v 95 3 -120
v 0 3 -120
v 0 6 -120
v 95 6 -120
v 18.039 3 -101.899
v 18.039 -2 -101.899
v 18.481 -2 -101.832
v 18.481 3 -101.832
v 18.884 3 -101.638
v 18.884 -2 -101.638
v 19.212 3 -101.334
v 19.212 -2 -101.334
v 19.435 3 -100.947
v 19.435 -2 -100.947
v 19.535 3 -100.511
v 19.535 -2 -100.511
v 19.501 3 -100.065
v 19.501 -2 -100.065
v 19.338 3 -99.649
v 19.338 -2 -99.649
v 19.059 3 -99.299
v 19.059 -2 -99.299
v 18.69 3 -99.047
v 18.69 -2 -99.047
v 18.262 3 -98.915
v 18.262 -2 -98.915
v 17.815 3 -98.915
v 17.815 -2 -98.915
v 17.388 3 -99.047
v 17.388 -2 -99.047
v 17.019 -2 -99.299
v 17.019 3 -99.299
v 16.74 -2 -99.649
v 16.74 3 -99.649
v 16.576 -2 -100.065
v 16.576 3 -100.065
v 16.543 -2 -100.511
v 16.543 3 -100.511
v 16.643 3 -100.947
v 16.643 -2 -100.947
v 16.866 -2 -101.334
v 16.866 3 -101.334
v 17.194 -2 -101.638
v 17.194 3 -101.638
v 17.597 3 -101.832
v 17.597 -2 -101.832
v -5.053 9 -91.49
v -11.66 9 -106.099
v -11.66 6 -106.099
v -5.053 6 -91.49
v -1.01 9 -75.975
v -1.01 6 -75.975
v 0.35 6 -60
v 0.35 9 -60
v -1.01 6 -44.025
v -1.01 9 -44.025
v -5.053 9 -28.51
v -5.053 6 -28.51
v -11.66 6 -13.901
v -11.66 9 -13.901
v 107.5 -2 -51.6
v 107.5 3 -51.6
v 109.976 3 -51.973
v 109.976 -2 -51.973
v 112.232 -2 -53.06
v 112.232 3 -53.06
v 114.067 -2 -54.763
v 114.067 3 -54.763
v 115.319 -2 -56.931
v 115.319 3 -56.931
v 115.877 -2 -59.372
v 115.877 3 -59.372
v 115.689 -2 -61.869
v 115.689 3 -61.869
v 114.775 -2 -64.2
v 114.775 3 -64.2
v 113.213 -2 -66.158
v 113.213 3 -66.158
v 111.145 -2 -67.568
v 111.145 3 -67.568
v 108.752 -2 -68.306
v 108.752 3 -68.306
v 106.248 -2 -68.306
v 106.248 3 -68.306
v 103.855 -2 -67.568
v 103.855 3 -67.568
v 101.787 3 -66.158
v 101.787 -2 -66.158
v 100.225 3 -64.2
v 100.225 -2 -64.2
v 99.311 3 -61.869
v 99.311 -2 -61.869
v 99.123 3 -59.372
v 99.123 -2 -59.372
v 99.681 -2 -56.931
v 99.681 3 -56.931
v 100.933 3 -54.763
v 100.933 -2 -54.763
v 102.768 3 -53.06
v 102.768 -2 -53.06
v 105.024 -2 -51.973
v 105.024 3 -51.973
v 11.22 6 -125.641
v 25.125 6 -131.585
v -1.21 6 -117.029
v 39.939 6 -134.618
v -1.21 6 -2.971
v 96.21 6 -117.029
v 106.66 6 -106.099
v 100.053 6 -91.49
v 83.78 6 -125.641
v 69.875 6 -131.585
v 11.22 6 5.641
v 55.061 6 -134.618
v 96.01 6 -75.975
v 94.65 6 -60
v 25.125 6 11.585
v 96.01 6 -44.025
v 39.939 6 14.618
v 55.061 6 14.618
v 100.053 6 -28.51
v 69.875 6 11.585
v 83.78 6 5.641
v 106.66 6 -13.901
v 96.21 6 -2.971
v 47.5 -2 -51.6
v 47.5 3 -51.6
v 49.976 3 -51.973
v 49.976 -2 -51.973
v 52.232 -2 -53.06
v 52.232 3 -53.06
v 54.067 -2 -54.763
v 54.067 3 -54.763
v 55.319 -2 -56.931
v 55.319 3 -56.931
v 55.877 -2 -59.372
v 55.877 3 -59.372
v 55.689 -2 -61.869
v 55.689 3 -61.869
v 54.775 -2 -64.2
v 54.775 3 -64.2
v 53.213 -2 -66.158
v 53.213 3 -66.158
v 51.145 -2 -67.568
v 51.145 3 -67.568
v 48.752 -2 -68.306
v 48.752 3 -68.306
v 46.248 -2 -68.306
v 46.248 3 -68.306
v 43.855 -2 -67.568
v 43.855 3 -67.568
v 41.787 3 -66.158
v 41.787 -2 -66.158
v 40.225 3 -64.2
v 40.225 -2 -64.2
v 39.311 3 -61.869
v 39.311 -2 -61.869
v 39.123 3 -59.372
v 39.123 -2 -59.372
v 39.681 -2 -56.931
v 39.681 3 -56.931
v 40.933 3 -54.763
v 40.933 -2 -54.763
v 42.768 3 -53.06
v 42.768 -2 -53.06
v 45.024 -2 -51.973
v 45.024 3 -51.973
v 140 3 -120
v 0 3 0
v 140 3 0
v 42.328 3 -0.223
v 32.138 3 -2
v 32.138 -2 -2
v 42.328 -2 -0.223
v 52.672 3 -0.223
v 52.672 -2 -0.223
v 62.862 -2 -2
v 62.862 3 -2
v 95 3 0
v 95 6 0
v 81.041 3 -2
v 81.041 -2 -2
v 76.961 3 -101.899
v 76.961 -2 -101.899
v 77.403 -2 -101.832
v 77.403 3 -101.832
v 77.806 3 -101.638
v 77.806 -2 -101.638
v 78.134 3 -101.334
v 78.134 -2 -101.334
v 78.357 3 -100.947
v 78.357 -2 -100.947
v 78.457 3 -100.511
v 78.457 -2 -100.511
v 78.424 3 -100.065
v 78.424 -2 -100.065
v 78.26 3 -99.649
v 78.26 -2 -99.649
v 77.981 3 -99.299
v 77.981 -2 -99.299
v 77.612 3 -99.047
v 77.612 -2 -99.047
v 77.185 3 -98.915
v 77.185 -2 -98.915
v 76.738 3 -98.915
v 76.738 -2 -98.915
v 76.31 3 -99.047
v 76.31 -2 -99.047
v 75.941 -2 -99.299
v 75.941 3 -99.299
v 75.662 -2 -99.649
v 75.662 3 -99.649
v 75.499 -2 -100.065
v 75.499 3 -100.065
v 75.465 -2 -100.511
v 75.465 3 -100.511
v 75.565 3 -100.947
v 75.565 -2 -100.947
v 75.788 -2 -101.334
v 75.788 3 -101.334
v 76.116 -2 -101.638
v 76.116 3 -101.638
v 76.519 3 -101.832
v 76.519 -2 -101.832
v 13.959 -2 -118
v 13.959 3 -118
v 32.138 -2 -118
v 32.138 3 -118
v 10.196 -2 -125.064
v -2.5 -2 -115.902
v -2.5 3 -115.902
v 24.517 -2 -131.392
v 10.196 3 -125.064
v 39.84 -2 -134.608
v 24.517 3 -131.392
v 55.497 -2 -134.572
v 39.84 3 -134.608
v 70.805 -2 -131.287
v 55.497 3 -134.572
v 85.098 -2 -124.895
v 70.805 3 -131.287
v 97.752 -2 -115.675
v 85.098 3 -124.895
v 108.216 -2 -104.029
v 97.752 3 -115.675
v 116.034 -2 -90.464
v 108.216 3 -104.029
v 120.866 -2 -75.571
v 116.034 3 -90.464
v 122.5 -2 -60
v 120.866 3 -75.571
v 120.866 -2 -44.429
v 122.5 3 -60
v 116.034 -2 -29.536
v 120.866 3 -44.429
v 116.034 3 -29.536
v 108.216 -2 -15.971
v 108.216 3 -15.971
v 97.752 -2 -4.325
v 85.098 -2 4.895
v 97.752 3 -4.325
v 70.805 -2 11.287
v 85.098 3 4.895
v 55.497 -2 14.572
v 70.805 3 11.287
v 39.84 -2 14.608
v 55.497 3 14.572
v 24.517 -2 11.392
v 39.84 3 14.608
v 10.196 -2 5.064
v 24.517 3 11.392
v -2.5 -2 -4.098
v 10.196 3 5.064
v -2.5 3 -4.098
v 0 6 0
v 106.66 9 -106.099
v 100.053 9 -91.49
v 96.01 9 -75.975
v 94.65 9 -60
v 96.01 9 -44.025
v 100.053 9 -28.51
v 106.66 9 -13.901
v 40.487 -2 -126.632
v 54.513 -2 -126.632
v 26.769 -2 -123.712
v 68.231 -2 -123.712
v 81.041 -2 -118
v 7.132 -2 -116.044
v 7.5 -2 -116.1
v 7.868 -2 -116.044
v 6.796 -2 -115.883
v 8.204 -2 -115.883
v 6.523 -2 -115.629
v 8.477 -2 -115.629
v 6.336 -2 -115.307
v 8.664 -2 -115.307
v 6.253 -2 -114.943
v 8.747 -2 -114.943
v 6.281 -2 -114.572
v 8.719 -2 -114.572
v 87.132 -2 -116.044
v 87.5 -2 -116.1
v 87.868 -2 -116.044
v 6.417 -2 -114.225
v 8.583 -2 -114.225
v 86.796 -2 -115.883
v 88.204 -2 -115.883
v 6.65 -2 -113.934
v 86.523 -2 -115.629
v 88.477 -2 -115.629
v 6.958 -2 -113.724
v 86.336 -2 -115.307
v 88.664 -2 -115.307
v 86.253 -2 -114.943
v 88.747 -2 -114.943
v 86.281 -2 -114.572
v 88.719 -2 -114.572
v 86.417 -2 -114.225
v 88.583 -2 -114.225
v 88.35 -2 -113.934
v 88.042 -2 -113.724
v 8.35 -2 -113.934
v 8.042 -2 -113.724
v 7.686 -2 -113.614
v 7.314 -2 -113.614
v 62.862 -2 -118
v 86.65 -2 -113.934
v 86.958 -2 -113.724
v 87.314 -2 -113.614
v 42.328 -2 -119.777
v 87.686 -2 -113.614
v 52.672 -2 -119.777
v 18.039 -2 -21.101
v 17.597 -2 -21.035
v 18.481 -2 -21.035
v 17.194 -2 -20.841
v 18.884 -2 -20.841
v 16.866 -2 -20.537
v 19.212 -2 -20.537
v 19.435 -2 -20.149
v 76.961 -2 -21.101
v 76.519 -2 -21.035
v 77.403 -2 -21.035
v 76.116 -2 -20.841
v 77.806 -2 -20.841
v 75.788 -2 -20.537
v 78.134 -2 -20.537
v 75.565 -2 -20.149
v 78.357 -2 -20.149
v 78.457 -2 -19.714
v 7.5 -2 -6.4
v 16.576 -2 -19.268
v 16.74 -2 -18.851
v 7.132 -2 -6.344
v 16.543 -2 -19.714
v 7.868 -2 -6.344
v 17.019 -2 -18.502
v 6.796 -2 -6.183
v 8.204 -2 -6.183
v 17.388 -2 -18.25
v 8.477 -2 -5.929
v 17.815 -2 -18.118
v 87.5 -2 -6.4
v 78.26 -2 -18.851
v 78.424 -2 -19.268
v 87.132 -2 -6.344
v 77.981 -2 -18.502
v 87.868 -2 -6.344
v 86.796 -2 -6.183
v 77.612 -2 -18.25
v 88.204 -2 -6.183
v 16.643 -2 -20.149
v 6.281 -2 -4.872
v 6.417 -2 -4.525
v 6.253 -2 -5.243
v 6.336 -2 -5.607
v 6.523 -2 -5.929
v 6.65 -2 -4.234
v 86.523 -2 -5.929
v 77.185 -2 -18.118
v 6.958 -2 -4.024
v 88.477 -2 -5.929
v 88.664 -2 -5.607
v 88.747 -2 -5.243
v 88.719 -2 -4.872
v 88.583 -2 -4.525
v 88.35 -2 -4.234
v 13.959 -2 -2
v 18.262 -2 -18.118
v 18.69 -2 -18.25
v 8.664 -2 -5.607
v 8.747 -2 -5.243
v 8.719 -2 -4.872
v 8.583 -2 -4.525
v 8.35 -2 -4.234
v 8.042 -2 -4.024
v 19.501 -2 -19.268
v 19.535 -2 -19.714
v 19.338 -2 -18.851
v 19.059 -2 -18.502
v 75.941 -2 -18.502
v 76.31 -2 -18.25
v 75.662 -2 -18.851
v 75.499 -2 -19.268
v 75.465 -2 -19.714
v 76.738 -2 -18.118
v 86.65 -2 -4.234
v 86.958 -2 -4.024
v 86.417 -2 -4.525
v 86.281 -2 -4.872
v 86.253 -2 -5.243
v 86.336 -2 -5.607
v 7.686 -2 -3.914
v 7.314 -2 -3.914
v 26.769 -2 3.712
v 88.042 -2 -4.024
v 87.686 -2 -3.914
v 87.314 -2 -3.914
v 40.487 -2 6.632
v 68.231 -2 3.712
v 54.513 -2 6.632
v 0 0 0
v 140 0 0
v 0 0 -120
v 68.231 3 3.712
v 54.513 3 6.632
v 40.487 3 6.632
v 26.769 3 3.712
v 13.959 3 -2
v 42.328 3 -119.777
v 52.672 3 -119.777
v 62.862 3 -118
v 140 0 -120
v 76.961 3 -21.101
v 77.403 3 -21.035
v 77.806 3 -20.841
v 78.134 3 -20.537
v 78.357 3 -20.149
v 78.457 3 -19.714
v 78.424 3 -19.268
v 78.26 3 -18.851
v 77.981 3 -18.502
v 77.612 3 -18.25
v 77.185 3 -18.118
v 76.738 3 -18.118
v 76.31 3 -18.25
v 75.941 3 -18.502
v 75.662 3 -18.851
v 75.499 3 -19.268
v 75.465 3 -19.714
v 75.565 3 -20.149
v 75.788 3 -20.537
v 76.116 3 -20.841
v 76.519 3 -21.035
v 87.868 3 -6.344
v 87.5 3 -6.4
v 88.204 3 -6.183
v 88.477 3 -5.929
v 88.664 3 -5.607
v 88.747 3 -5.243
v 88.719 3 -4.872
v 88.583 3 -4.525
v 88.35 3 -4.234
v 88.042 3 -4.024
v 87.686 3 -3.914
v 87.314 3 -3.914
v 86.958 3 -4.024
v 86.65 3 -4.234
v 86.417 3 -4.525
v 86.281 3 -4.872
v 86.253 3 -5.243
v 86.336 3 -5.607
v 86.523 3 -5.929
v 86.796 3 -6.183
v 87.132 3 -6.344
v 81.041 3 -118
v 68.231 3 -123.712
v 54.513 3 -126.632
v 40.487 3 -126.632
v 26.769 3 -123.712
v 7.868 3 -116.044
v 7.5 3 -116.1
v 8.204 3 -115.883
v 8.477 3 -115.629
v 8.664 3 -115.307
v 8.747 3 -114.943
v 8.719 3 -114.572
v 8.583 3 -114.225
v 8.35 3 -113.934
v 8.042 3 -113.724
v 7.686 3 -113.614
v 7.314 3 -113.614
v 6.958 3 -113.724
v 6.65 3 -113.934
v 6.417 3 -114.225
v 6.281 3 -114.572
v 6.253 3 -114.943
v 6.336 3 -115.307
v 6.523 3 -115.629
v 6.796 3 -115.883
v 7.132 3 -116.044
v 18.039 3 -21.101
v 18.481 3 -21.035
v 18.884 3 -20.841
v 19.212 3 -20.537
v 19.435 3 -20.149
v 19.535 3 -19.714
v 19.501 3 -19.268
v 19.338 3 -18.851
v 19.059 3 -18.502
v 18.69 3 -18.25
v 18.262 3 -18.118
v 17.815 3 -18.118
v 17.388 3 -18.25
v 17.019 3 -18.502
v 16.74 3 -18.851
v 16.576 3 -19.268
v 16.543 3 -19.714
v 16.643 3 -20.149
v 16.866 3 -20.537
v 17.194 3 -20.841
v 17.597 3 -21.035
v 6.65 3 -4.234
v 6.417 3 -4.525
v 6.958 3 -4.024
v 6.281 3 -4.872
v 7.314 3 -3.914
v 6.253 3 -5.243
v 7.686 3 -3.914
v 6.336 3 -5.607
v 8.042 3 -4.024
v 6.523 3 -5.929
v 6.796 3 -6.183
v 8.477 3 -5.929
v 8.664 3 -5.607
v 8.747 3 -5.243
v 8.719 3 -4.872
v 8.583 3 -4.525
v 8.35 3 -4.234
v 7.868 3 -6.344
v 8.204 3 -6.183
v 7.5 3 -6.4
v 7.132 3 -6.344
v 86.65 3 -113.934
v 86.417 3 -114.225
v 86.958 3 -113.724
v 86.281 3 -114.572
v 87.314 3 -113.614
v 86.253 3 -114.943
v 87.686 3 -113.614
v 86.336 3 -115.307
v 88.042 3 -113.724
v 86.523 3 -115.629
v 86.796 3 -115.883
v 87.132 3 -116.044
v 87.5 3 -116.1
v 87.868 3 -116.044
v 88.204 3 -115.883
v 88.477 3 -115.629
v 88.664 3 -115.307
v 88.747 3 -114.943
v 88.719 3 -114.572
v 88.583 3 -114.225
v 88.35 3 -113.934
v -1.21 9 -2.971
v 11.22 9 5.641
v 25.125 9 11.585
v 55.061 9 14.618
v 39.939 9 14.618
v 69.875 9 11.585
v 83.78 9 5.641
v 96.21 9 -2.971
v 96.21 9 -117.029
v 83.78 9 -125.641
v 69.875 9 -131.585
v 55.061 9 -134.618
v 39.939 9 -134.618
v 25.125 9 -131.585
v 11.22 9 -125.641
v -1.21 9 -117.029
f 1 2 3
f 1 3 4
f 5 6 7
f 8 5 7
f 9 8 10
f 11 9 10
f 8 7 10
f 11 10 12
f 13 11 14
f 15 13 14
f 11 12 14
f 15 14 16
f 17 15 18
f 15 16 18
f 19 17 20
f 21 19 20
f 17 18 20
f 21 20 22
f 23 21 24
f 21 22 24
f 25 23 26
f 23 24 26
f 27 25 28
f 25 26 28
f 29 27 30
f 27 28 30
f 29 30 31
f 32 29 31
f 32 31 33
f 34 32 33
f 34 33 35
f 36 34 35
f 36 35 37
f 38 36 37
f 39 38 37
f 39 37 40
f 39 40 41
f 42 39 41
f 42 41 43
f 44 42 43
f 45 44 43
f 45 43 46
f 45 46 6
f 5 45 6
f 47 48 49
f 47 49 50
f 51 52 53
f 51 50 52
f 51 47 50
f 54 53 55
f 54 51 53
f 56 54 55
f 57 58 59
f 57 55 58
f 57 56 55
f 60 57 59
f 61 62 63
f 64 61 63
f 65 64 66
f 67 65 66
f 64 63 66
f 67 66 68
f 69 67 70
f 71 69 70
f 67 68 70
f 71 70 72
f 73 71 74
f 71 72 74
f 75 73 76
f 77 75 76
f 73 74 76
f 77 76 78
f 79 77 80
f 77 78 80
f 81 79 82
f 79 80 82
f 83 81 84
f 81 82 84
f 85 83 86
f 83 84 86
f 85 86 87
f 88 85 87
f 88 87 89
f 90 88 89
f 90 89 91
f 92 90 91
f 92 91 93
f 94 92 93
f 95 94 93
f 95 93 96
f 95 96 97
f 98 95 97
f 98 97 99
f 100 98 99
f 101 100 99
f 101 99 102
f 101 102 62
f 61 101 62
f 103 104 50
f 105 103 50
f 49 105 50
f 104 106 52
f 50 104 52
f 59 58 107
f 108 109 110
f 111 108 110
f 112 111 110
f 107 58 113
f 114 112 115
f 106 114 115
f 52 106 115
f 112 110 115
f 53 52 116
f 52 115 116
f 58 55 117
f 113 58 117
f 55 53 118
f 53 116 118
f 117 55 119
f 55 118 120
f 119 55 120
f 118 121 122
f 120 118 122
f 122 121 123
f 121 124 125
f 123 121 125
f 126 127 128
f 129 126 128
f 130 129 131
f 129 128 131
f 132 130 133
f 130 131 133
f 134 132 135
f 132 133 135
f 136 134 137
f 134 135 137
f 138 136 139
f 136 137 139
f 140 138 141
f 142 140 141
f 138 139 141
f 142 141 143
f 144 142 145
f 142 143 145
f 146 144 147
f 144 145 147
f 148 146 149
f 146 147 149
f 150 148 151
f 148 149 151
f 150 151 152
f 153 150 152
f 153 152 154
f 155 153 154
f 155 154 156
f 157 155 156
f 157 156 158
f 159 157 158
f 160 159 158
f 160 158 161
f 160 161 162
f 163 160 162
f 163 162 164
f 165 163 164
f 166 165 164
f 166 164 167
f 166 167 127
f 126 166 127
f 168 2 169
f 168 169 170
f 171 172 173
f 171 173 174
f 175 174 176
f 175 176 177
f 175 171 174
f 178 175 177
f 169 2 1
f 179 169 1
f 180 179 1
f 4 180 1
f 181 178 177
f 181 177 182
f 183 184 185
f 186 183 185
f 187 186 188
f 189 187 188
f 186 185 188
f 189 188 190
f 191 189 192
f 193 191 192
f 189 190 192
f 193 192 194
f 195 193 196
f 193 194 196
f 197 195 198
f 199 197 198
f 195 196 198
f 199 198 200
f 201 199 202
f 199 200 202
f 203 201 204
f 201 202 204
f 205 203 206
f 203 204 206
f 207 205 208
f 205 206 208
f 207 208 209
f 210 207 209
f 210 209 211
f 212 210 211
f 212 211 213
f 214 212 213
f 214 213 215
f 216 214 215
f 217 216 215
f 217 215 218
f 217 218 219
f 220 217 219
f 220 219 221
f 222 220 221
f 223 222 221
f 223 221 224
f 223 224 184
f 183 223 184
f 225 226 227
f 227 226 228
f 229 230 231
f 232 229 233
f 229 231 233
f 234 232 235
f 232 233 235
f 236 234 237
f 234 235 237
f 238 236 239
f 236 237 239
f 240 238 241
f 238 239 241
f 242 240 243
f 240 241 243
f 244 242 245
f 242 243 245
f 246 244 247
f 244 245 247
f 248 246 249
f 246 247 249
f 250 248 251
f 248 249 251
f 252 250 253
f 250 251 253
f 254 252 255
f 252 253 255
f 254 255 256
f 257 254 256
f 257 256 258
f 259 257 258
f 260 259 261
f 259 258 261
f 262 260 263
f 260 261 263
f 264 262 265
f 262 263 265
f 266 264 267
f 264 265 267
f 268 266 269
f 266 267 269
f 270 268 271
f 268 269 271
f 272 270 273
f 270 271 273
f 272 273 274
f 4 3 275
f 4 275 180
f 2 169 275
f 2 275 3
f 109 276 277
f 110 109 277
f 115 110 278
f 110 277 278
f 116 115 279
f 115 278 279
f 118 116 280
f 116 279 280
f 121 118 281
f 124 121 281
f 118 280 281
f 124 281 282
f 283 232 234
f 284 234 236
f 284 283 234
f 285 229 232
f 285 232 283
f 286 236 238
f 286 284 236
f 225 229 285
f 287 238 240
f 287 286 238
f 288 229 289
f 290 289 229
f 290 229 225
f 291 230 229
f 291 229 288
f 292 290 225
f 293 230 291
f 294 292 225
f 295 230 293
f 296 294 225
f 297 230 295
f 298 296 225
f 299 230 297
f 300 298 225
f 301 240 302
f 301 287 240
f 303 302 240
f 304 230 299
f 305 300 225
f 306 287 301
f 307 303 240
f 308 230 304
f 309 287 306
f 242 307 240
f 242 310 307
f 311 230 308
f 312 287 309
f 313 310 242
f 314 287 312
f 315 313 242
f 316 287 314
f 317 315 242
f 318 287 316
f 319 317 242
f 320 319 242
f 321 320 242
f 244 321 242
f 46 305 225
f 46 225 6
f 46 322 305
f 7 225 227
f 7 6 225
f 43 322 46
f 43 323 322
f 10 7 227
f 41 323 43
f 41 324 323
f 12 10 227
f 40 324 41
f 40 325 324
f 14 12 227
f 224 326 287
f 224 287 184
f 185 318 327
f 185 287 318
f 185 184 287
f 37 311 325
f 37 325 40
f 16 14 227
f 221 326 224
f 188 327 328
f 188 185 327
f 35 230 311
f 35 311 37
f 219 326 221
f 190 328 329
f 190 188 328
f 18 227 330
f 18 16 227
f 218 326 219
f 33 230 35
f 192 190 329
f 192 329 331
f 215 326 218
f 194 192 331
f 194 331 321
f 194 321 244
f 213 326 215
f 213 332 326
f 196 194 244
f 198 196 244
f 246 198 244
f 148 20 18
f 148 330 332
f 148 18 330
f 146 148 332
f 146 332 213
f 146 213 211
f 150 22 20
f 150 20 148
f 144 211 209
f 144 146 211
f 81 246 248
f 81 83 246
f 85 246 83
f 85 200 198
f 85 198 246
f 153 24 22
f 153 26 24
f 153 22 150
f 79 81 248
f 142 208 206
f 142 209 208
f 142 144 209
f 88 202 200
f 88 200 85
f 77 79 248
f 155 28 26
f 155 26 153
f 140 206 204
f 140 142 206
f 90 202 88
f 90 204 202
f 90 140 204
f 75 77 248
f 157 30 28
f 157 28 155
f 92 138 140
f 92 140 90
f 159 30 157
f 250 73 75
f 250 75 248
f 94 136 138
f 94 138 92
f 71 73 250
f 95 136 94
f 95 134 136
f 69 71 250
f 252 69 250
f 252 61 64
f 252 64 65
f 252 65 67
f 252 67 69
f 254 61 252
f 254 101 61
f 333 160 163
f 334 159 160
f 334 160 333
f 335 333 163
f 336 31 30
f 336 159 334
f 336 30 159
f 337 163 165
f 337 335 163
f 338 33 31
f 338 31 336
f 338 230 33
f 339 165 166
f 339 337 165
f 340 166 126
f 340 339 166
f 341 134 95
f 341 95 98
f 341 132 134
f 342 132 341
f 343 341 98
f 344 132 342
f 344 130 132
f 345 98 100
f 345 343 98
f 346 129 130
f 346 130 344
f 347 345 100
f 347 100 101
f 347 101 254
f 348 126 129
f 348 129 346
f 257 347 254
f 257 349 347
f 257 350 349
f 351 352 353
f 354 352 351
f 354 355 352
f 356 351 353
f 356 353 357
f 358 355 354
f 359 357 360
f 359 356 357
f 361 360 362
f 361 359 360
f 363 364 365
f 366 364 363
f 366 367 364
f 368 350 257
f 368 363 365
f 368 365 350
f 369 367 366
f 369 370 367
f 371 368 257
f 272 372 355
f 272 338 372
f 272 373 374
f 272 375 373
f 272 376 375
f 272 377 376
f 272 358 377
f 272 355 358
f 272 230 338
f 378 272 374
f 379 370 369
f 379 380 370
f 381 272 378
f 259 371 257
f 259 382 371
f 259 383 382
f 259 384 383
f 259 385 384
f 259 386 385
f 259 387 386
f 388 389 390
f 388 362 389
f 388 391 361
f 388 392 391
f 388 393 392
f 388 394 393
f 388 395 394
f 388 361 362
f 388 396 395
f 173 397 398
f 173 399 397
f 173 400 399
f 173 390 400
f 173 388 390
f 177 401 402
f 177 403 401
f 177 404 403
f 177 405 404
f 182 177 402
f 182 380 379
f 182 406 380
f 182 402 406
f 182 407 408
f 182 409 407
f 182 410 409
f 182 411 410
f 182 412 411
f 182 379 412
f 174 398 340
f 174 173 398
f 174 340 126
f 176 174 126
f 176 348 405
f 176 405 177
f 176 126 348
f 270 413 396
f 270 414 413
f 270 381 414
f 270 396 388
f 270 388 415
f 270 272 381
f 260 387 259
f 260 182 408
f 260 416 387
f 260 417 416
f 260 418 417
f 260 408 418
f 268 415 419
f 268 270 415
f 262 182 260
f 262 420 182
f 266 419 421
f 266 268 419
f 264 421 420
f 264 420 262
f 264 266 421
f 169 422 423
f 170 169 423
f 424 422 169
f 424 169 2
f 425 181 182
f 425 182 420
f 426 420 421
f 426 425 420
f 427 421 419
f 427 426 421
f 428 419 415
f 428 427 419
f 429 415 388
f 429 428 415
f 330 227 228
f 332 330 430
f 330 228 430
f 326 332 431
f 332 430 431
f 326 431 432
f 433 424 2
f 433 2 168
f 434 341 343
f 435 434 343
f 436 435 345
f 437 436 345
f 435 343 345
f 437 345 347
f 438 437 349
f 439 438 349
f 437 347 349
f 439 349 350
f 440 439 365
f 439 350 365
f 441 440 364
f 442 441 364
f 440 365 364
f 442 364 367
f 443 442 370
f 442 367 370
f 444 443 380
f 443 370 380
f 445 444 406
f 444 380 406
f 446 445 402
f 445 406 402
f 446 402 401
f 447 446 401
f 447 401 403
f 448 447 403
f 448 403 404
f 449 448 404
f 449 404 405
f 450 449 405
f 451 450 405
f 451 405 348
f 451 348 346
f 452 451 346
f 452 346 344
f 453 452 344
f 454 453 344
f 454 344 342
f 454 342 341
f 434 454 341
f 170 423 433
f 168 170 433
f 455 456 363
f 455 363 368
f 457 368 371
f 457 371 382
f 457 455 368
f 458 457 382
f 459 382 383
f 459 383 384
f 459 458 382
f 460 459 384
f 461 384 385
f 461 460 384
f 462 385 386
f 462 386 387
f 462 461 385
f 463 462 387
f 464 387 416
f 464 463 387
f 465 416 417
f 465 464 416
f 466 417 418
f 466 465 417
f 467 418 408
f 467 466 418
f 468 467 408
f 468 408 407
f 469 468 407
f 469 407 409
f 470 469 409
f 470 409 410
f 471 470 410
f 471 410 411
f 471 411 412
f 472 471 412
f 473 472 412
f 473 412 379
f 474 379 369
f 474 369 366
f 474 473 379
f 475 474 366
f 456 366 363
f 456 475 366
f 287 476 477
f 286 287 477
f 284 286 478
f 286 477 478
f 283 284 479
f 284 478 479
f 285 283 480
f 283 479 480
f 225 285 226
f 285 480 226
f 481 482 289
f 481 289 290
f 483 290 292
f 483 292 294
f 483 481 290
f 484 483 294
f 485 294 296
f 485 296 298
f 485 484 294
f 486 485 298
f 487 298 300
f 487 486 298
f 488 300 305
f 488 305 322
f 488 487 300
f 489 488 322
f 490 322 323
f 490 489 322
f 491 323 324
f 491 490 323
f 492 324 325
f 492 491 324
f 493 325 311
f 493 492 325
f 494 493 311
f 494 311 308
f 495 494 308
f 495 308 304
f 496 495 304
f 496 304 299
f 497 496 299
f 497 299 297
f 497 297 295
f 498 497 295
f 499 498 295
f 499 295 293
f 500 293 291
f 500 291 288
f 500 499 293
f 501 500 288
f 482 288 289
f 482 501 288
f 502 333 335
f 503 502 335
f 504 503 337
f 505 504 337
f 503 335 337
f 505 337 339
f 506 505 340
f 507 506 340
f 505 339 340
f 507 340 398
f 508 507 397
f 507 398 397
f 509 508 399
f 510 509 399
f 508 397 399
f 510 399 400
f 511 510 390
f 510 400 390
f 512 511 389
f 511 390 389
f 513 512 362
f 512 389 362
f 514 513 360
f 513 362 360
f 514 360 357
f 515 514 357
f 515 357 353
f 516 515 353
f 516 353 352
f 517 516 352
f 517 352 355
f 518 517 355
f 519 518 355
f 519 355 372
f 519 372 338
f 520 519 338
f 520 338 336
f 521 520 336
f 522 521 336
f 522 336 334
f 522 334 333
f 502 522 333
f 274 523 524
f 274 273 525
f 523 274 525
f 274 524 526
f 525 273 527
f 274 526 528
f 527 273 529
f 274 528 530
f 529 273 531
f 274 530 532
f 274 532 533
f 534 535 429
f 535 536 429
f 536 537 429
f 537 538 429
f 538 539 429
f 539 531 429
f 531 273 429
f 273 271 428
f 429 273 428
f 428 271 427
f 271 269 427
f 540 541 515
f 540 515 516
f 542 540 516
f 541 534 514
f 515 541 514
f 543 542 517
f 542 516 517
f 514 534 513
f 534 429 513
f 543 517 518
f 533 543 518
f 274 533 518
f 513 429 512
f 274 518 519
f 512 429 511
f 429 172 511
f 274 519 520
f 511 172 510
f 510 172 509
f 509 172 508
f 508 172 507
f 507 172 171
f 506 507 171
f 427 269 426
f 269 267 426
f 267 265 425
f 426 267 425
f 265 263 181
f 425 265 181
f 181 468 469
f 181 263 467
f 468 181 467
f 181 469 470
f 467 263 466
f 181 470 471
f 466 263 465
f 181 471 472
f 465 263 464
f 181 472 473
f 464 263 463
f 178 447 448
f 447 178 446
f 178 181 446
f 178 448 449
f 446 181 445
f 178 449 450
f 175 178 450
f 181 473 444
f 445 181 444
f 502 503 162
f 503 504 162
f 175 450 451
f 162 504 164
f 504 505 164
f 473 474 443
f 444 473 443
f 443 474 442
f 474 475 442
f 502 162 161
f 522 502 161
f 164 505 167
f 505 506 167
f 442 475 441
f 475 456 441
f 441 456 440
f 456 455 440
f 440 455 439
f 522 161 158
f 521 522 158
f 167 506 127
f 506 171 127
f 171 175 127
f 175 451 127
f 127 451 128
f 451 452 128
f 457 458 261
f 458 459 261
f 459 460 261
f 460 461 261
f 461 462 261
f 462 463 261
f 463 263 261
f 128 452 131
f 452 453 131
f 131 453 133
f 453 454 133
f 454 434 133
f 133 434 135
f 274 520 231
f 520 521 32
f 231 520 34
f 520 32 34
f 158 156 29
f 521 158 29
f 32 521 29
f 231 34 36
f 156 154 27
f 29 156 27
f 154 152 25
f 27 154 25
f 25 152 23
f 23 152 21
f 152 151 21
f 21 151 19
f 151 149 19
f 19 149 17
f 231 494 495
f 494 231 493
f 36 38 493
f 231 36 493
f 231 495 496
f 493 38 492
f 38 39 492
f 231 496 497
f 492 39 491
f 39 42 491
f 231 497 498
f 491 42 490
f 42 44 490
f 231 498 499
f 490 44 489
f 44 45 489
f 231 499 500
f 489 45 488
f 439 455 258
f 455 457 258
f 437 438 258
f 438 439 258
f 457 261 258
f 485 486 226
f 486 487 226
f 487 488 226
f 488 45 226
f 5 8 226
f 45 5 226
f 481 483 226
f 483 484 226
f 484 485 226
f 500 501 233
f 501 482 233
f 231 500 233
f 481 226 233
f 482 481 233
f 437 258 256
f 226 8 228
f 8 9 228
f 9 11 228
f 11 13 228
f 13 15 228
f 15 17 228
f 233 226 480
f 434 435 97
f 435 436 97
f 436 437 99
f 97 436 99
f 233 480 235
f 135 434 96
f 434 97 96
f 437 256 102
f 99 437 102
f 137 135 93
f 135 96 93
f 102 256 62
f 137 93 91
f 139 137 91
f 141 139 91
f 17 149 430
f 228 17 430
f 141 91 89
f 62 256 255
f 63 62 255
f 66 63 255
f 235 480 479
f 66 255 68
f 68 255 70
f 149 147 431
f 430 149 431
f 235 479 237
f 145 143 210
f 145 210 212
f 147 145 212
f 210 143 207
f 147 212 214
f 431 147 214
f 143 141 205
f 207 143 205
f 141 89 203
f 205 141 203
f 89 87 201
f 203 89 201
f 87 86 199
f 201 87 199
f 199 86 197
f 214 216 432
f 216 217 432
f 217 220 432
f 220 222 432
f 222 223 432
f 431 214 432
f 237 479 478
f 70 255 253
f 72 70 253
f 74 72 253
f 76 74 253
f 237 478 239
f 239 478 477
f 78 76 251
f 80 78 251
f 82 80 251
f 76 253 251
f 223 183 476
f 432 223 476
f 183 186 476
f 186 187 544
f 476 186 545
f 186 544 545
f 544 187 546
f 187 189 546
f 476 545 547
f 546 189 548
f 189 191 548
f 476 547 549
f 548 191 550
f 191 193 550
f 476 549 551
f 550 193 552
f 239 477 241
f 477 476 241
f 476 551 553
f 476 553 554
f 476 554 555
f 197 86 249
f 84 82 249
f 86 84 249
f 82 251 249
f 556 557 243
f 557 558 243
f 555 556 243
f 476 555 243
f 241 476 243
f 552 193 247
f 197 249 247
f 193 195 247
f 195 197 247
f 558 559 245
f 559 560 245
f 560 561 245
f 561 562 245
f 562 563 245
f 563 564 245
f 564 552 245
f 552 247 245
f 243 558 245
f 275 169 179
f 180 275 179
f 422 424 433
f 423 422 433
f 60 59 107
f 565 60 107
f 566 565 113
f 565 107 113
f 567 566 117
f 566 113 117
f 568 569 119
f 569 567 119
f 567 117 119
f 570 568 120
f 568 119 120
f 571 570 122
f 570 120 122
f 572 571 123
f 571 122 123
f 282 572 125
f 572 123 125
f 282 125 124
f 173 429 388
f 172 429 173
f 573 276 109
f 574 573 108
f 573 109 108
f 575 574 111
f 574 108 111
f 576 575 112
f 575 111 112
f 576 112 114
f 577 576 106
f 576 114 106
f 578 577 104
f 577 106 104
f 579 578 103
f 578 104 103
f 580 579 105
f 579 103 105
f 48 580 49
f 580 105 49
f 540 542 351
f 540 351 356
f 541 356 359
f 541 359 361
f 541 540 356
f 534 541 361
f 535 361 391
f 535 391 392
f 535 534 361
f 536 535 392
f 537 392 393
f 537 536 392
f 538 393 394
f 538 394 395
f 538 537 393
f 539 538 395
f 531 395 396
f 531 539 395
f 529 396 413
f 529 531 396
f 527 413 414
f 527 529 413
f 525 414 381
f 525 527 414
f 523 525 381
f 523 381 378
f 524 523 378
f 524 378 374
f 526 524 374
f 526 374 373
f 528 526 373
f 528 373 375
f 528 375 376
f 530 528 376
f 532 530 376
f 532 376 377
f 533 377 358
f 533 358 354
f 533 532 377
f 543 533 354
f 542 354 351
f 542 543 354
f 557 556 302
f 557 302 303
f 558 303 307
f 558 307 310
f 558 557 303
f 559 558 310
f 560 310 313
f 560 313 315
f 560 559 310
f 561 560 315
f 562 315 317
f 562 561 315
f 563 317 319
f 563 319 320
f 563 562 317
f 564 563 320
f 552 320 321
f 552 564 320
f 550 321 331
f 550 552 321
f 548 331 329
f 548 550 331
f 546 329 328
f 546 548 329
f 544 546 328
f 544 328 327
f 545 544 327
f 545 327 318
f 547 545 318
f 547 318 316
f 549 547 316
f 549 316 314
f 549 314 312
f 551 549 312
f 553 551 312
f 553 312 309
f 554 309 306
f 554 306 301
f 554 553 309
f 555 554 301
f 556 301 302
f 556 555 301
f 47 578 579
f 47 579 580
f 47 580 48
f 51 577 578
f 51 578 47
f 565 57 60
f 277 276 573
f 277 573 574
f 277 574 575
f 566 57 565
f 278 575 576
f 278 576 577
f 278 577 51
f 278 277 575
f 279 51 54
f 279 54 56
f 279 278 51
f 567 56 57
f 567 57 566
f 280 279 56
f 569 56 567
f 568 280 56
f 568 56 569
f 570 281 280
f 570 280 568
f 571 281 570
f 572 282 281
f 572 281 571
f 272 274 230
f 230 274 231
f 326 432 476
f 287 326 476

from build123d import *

# Parameters (mm, degrees)
SKETCH1_W                   = 140
SKETCH1_H                   = 120
COMPACT_DEPTH               = 3
SKETCH4_W                   = 95
SKETCH4_H                   = 120
SUPERCOMPACT_DEPTH          = 3
SKETCH7_R                   = 75
APPLE_BASE_DEPTH            = 3
SIDECUTS_DEPTH              = 195.694632694
APPLE_BASE_2_DEPTH          = 3
BOSS_EXTRUDE4_DEPTH         = 3
BASE_PLATE_FILLET_R         = 0.001
TOP_BOTTOM_EXTENSIONS_DEPTH = 3
SKETCH35_R                  = 1.25
SPACERHOLES_DEPTH           = 10
CUT_EXTRUDE4_DEPTH          = 10
SKETCH39_R                  = 75
SKETCH39_R_2                = 1.25
BOSS_EXTRUDE5_DEPTH         = 5
CUT_EXTRUDE5_DEPTH          = 150
SKETCH41_R                  = 8.4
CUT_EXTRUDE6_DEPTH          = 10
SKETCH44_R                  = 8.4
CUT_EXTRUDE7_DEPTH          = 10
SKETCH45_R                  = 1.5
CUT_EXTRUDE8_DEPTH          = 12
SKETCH46_R                  = 1.5
CUT_EXTRUDE9_DEPTH          = 10
CUT_EXTRUDE10_DEPTH         = 10
CUT_EXTRUDE11_DEPTH         = 10


with BuildPart() as part:
    # Sketch1 → Compact (new body)
    with BuildSketch(Plane(origin=(0, 0, 0), x_dir=(1, 0, 0), z_dir=(0, 1, 0))):
        with Locations((70, 60)):
            Rectangle(SKETCH1_W, SKETCH1_H)
    extrude(amount=COMPACT_DEPTH)


with BuildPart() as body_2:
    # Sketch4 → SuperCompact (new body)
    with BuildSketch(Plane(origin=(0, 3, 0), x_dir=(1, 0, 0), z_dir=(0, 1, 0))):
        with Locations((47.5, 60)):
            Rectangle(SKETCH4_W, SKETCH4_H)
    extrude(amount=SUPERCOMPACT_DEPTH)


with BuildPart() as body_3:
    # Sketch7 → Apple Base (new body)
    with BuildSketch(Plane(origin=(0, 6, 0), x_dir=(1, 0, 0), z_dir=(0, 1, 0))):
        with Locations(Location((47.5, 60, 0), (0, 0, 270))):
            Circle(SKETCH7_R)
    extrude(amount=APPLE_BASE_DEPTH)

    # Sketch8 → SideCuts (cut, through all)
    with BuildSketch(Plane(origin=(0, 9, 0), x_dir=(1, 0, 0), z_dir=(0, 1, 0))):
        with BuildLine():
            ThreePointArc((-11.66, 106.098746187), (0.350007958, 60), (-11.66, 13.901253813))
            ThreePointArc((-11.66, 13.901253813), (-27.5, 60), (-11.66, 106.098746187))
        make_face()
        with BuildLine():
            ThreePointArc((106.66, 106.098746187), (94.649992042, 60), (106.66, 13.901253813))
            ThreePointArc((106.66, 13.901253813), (122.5, 60), (106.66, 106.098746187))
        make_face()
    extrude(amount=-SIDECUTS_DEPTH, mode=Mode.SUBTRACT)


with BuildPart() as body_4:
    # Sketch9 → Apple_Base 2 (new body)
    with BuildSketch(Plane.XZ.offset(-6)):
        with BuildLine():
            ThreePointArc((106.66, -13.901253813), (47.5, 15), (-11.66, -13.901253813))
            ThreePointArc((-11.66, -13.901253813), (0.350007958, -60), (-11.66, -106.098746187))
            ThreePointArc((-11.66, -106.098746187), (47.5, -135), (106.66, -106.098746187))
            ThreePointArc((106.66, -106.098746187), (94.649992042, -60), (106.66, -13.901253813))
        make_face()
    extrude(amount=APPLE_BASE_2_DEPTH)

    # Sketch10 → Boss-Extrude4 (add)
    with BuildSketch(Plane(origin=(0, 6, 0), x_dir=(1, 0, 0), z_dir=(0, 1, 0))):
        with BuildLine():
            Line((-11.66, 106.098746187), (-11.66, 13.901253813))
            ThreePointArc((-11.66, 13.901253813), (0.350007958, 60), (-11.66, 106.098746187))
        make_face()
        with BuildLine():
            Line((106.66, 106.098746187), (106.66, 13.901253813))
            ThreePointArc((106.66, 13.901253813), (94.649992042, 60), (106.66, 106.098746187))
        make_face()
    extrude(amount=-BOSS_EXTRUDE4_DEPTH)

    # Base_Plate_Fillet
    base_plate_fillet_edges = [body_4.edges().sort_by_distance(p)[0] for p in [
        (-11.66, 3, -60),
        (-11.66, 6, -60),
        (47.5, 3, -135),
        (106.66, 3, -60),
        (106.66, 6, -60),
        (47.5, 6, -135),
        (47.5, 6, 15),
        (106.66, 4.5, -106.098746187),
        (-11.66, 4.5, -106.098746187),
        (-11.66, 4.5, -13.901253813),
        (106.66, 4.5, -13.901253813),
        (47.5, 3, 15),
    ]]
    fillet(base_plate_fillet_edges, radius=BASE_PLATE_FILLET_R)

    # Sketch25 → Top Bottom extensions (add)
    with BuildSketch(Plane(origin=(0, 6, 0), x_dir=(1, 0, 0), z_dir=(0, 1, 0))):
        with BuildLine():
            Line((-11.659005821, 106.097402592), (-11.659005821, 111.097402592))
            ThreePointArc((-11.659005821, 111.097402592), (47.5, 138.794628322), (106.659005821, 111.097402592))
            Line((106.659005821, 111.097402592), (106.659005821, 106.097402592))
            ThreePointArc((106.659005821, 106.097402592), (47.5, 133.794628322), (-11.659005821, 106.097402592))
        make_face()
        with BuildLine():
            Line((106.659005821, 13.902597408), (106.659005821, 8.902597408))
            ThreePointArc((106.659005821, 8.902597408), (47.5, -18.794628322), (-11.659005821, 8.902597408))
            Line((-11.659005821, 8.902597408), (-11.659005821, 13.902597408))
            ThreePointArc((-11.659005821, 13.902597408), (47.5, -13.794628322), (106.659005821, 13.902597408))
        make_face()
    extrude(amount=-TOP_BOTTOM_EXTENSIONS_DEPTH)

    # Sketch35 → SpacerHoles (cut)
    with BuildSketch(Plane.XZ.offset(-3)):
        with Locations(Location((7.5, -5.15, 0), (0, 0, 270))):
            Circle(SKETCH35_R)
        with Locations(Location((87.5, -5.15, 0), (0, 0, 270))):
            Circle(SKETCH35_R)
        with Locations(Location((87.5, -114.85, 0), (0, 0, 270))):
            Circle(SKETCH35_R)
        with Locations(Location((7.5, -114.85, 0), (0, 0, 270))):
            Circle(SKETCH35_R)
    extrude(amount=-SPACERHOLES_DEPTH, mode=Mode.SUBTRACT)

    # Sketch38 → Cut-Extrude4 (cut)
    with BuildSketch(Plane.XZ.offset(-3)):
        Polygon((47.5, 37.050137759), (120.372278362, 37.050137759), (120.372278362, -158.601845129), (-29.177494987, -158.601845129), (-29.177494987, 37.050137759), align=None)
        Polygon((-6.659, -60), (-6.659, 24.702355976), (101.659, 24.702355976), (101.659, -143.843523469), (-6.659, -143.843523469), align=None, mode=Mode.SUBTRACT)
    extrude(amount=-CUT_EXTRUDE4_DEPTH, mode=Mode.SUBTRACT)

    # Sketch39 → Boss-Extrude5 (add)
    with BuildSketch(Plane.XZ.offset(-3)):
        with Locations(Location((47.5, -60, 0), (0, 0, 43.770209918))):
            Circle(SKETCH39_R)
        with Locations(Location((87.5, -5.15, 0), (0, 0, 270))):
            Circle(SKETCH39_R_2, mode=Mode.SUBTRACT)
        with Locations(Location((7.5, -5.15, 0), (0, 0, 270))):
            Circle(SKETCH39_R_2, mode=Mode.SUBTRACT)
        with Locations(Location((7.5, -114.85, 0), (0, 0, 270))):
            Circle(SKETCH39_R_2, mode=Mode.SUBTRACT)
        with Locations(Location((87.5, -114.85, 0), (0, 0, 270))):
            Circle(SKETCH39_R_2, mode=Mode.SUBTRACT)
    extrude(amount=BOSS_EXTRUDE5_DEPTH)

    # Sketch40 → Cut-Extrude5 (cut)
    with BuildSketch(Plane(origin=(101.659, 0, 0), x_dir=(0, 0, -1), z_dir=(1, 0, 0))):
        Polygon((3.460058054, 3), (-22.733784582, 3), (-22.733784582, 8.214035789), (147.50303534, 8.214035789), (147.50303534, 3), align=None)
    extrude(amount=-CUT_EXTRUDE5_DEPTH, mode=Mode.SUBTRACT)

    # Sketch41 → Cut-Extrude6 (cut)
    with BuildSketch(Plane(origin=(0, 3, 0), x_dir=(1, 0, 0), z_dir=(0, 1, 0))):
        with Locations(Location((47.5, 60, 0), (0, 0, 270))):
            Circle(SKETCH41_R)
    extrude(amount=-CUT_EXTRUDE6_DEPTH, mode=Mode.SUBTRACT)

    # Sketch44 → Cut-Extrude7 (cut)
    with BuildSketch(Plane(origin=(0, 3, 0), x_dir=(1, 0, 0), z_dir=(0, 1, 0))):
        with Locations(Location((107.5, 60, 0), (0, 0, 270))):
            Circle(SKETCH44_R)
    extrude(amount=-CUT_EXTRUDE7_DEPTH, mode=Mode.SUBTRACT)

    # Sketch45 → Cut-Extrude8 (cut)
    with BuildSketch(Plane.XZ.offset(2)):
        with Locations(Location((76.961112303, -100.398550245, 0), (0, 0, 270))):
            Circle(SKETCH45_R)
        with Locations(Location((18.038887697, -100.398550245, 0), (0, 0, 270))):
            Circle(SKETCH45_R)
        with Locations(Location((18.038887697, -19.601449755, 0), (0, 0, 270))):
            Circle(SKETCH45_R)
    extrude(amount=-CUT_EXTRUDE8_DEPTH, mode=Mode.SUBTRACT)

    # Sketch46 → Cut-Extrude9 (cut)
    with BuildSketch(Plane.XZ.offset(2)):
        with Locations(Location((76.961112303, -19.601449755, 0), (0, 0, 270))):
            Circle(SKETCH46_R)
    extrude(amount=-CUT_EXTRUDE9_DEPTH, mode=Mode.SUBTRACT)

    # Sketch48 → Cut-Extrude10 (cut)
    with BuildSketch(Plane(origin=(0, 3, 0), x_dir=(1, 0, 0), z_dir=(0, 1, 0))):
        with BuildLine():
            Line((-2.5, 4.098300563), (-2.5, 60))
            Line((-2.5, 60), (-2.5, 115.901699437))
            ThreePointArc((-2.5, 115.901699437), (-27.5, 60), (-2.5, 4.098300563))
        make_face()
    extrude(amount=-CUT_EXTRUDE10_DEPTH, mode=Mode.SUBTRACT)

    # Sketch49 → Cut-Extrude11 (cut)
    with BuildSketch(Plane(origin=(0, 3, 0), x_dir=(1, 0, 0), z_dir=(0, 1, 0))):
        with BuildLine():
            Line((62.862291496, 118), (81.041019662, 118))
            ThreePointArc((81.041019662, 118), (47.5, 127), (13.958980338, 118))
            Line((13.958980338, 118), (32.137708504, 118))
            ThreePointArc((32.137708504, 118), (47.5, 120), (62.862291496, 118))
        make_face()
        with BuildLine():
            ThreePointArc((32.137708504, 2), (47.5, 0), (62.862291496, 2))
            Line((62.862291496, 2), (81.041019662, 2))
            ThreePointArc((81.041019662, 2), (47.5, -7), (13.958980338, 2))
            Line((13.958980338, 2), (32.137708504, 2))
        make_face()
    extrude(amount=-CUT_EXTRUDE11_DEPTH, mode=Mode.SUBTRACT)


solid = Compound([part.part, body_2.part, body_3.part, body_4.part])
